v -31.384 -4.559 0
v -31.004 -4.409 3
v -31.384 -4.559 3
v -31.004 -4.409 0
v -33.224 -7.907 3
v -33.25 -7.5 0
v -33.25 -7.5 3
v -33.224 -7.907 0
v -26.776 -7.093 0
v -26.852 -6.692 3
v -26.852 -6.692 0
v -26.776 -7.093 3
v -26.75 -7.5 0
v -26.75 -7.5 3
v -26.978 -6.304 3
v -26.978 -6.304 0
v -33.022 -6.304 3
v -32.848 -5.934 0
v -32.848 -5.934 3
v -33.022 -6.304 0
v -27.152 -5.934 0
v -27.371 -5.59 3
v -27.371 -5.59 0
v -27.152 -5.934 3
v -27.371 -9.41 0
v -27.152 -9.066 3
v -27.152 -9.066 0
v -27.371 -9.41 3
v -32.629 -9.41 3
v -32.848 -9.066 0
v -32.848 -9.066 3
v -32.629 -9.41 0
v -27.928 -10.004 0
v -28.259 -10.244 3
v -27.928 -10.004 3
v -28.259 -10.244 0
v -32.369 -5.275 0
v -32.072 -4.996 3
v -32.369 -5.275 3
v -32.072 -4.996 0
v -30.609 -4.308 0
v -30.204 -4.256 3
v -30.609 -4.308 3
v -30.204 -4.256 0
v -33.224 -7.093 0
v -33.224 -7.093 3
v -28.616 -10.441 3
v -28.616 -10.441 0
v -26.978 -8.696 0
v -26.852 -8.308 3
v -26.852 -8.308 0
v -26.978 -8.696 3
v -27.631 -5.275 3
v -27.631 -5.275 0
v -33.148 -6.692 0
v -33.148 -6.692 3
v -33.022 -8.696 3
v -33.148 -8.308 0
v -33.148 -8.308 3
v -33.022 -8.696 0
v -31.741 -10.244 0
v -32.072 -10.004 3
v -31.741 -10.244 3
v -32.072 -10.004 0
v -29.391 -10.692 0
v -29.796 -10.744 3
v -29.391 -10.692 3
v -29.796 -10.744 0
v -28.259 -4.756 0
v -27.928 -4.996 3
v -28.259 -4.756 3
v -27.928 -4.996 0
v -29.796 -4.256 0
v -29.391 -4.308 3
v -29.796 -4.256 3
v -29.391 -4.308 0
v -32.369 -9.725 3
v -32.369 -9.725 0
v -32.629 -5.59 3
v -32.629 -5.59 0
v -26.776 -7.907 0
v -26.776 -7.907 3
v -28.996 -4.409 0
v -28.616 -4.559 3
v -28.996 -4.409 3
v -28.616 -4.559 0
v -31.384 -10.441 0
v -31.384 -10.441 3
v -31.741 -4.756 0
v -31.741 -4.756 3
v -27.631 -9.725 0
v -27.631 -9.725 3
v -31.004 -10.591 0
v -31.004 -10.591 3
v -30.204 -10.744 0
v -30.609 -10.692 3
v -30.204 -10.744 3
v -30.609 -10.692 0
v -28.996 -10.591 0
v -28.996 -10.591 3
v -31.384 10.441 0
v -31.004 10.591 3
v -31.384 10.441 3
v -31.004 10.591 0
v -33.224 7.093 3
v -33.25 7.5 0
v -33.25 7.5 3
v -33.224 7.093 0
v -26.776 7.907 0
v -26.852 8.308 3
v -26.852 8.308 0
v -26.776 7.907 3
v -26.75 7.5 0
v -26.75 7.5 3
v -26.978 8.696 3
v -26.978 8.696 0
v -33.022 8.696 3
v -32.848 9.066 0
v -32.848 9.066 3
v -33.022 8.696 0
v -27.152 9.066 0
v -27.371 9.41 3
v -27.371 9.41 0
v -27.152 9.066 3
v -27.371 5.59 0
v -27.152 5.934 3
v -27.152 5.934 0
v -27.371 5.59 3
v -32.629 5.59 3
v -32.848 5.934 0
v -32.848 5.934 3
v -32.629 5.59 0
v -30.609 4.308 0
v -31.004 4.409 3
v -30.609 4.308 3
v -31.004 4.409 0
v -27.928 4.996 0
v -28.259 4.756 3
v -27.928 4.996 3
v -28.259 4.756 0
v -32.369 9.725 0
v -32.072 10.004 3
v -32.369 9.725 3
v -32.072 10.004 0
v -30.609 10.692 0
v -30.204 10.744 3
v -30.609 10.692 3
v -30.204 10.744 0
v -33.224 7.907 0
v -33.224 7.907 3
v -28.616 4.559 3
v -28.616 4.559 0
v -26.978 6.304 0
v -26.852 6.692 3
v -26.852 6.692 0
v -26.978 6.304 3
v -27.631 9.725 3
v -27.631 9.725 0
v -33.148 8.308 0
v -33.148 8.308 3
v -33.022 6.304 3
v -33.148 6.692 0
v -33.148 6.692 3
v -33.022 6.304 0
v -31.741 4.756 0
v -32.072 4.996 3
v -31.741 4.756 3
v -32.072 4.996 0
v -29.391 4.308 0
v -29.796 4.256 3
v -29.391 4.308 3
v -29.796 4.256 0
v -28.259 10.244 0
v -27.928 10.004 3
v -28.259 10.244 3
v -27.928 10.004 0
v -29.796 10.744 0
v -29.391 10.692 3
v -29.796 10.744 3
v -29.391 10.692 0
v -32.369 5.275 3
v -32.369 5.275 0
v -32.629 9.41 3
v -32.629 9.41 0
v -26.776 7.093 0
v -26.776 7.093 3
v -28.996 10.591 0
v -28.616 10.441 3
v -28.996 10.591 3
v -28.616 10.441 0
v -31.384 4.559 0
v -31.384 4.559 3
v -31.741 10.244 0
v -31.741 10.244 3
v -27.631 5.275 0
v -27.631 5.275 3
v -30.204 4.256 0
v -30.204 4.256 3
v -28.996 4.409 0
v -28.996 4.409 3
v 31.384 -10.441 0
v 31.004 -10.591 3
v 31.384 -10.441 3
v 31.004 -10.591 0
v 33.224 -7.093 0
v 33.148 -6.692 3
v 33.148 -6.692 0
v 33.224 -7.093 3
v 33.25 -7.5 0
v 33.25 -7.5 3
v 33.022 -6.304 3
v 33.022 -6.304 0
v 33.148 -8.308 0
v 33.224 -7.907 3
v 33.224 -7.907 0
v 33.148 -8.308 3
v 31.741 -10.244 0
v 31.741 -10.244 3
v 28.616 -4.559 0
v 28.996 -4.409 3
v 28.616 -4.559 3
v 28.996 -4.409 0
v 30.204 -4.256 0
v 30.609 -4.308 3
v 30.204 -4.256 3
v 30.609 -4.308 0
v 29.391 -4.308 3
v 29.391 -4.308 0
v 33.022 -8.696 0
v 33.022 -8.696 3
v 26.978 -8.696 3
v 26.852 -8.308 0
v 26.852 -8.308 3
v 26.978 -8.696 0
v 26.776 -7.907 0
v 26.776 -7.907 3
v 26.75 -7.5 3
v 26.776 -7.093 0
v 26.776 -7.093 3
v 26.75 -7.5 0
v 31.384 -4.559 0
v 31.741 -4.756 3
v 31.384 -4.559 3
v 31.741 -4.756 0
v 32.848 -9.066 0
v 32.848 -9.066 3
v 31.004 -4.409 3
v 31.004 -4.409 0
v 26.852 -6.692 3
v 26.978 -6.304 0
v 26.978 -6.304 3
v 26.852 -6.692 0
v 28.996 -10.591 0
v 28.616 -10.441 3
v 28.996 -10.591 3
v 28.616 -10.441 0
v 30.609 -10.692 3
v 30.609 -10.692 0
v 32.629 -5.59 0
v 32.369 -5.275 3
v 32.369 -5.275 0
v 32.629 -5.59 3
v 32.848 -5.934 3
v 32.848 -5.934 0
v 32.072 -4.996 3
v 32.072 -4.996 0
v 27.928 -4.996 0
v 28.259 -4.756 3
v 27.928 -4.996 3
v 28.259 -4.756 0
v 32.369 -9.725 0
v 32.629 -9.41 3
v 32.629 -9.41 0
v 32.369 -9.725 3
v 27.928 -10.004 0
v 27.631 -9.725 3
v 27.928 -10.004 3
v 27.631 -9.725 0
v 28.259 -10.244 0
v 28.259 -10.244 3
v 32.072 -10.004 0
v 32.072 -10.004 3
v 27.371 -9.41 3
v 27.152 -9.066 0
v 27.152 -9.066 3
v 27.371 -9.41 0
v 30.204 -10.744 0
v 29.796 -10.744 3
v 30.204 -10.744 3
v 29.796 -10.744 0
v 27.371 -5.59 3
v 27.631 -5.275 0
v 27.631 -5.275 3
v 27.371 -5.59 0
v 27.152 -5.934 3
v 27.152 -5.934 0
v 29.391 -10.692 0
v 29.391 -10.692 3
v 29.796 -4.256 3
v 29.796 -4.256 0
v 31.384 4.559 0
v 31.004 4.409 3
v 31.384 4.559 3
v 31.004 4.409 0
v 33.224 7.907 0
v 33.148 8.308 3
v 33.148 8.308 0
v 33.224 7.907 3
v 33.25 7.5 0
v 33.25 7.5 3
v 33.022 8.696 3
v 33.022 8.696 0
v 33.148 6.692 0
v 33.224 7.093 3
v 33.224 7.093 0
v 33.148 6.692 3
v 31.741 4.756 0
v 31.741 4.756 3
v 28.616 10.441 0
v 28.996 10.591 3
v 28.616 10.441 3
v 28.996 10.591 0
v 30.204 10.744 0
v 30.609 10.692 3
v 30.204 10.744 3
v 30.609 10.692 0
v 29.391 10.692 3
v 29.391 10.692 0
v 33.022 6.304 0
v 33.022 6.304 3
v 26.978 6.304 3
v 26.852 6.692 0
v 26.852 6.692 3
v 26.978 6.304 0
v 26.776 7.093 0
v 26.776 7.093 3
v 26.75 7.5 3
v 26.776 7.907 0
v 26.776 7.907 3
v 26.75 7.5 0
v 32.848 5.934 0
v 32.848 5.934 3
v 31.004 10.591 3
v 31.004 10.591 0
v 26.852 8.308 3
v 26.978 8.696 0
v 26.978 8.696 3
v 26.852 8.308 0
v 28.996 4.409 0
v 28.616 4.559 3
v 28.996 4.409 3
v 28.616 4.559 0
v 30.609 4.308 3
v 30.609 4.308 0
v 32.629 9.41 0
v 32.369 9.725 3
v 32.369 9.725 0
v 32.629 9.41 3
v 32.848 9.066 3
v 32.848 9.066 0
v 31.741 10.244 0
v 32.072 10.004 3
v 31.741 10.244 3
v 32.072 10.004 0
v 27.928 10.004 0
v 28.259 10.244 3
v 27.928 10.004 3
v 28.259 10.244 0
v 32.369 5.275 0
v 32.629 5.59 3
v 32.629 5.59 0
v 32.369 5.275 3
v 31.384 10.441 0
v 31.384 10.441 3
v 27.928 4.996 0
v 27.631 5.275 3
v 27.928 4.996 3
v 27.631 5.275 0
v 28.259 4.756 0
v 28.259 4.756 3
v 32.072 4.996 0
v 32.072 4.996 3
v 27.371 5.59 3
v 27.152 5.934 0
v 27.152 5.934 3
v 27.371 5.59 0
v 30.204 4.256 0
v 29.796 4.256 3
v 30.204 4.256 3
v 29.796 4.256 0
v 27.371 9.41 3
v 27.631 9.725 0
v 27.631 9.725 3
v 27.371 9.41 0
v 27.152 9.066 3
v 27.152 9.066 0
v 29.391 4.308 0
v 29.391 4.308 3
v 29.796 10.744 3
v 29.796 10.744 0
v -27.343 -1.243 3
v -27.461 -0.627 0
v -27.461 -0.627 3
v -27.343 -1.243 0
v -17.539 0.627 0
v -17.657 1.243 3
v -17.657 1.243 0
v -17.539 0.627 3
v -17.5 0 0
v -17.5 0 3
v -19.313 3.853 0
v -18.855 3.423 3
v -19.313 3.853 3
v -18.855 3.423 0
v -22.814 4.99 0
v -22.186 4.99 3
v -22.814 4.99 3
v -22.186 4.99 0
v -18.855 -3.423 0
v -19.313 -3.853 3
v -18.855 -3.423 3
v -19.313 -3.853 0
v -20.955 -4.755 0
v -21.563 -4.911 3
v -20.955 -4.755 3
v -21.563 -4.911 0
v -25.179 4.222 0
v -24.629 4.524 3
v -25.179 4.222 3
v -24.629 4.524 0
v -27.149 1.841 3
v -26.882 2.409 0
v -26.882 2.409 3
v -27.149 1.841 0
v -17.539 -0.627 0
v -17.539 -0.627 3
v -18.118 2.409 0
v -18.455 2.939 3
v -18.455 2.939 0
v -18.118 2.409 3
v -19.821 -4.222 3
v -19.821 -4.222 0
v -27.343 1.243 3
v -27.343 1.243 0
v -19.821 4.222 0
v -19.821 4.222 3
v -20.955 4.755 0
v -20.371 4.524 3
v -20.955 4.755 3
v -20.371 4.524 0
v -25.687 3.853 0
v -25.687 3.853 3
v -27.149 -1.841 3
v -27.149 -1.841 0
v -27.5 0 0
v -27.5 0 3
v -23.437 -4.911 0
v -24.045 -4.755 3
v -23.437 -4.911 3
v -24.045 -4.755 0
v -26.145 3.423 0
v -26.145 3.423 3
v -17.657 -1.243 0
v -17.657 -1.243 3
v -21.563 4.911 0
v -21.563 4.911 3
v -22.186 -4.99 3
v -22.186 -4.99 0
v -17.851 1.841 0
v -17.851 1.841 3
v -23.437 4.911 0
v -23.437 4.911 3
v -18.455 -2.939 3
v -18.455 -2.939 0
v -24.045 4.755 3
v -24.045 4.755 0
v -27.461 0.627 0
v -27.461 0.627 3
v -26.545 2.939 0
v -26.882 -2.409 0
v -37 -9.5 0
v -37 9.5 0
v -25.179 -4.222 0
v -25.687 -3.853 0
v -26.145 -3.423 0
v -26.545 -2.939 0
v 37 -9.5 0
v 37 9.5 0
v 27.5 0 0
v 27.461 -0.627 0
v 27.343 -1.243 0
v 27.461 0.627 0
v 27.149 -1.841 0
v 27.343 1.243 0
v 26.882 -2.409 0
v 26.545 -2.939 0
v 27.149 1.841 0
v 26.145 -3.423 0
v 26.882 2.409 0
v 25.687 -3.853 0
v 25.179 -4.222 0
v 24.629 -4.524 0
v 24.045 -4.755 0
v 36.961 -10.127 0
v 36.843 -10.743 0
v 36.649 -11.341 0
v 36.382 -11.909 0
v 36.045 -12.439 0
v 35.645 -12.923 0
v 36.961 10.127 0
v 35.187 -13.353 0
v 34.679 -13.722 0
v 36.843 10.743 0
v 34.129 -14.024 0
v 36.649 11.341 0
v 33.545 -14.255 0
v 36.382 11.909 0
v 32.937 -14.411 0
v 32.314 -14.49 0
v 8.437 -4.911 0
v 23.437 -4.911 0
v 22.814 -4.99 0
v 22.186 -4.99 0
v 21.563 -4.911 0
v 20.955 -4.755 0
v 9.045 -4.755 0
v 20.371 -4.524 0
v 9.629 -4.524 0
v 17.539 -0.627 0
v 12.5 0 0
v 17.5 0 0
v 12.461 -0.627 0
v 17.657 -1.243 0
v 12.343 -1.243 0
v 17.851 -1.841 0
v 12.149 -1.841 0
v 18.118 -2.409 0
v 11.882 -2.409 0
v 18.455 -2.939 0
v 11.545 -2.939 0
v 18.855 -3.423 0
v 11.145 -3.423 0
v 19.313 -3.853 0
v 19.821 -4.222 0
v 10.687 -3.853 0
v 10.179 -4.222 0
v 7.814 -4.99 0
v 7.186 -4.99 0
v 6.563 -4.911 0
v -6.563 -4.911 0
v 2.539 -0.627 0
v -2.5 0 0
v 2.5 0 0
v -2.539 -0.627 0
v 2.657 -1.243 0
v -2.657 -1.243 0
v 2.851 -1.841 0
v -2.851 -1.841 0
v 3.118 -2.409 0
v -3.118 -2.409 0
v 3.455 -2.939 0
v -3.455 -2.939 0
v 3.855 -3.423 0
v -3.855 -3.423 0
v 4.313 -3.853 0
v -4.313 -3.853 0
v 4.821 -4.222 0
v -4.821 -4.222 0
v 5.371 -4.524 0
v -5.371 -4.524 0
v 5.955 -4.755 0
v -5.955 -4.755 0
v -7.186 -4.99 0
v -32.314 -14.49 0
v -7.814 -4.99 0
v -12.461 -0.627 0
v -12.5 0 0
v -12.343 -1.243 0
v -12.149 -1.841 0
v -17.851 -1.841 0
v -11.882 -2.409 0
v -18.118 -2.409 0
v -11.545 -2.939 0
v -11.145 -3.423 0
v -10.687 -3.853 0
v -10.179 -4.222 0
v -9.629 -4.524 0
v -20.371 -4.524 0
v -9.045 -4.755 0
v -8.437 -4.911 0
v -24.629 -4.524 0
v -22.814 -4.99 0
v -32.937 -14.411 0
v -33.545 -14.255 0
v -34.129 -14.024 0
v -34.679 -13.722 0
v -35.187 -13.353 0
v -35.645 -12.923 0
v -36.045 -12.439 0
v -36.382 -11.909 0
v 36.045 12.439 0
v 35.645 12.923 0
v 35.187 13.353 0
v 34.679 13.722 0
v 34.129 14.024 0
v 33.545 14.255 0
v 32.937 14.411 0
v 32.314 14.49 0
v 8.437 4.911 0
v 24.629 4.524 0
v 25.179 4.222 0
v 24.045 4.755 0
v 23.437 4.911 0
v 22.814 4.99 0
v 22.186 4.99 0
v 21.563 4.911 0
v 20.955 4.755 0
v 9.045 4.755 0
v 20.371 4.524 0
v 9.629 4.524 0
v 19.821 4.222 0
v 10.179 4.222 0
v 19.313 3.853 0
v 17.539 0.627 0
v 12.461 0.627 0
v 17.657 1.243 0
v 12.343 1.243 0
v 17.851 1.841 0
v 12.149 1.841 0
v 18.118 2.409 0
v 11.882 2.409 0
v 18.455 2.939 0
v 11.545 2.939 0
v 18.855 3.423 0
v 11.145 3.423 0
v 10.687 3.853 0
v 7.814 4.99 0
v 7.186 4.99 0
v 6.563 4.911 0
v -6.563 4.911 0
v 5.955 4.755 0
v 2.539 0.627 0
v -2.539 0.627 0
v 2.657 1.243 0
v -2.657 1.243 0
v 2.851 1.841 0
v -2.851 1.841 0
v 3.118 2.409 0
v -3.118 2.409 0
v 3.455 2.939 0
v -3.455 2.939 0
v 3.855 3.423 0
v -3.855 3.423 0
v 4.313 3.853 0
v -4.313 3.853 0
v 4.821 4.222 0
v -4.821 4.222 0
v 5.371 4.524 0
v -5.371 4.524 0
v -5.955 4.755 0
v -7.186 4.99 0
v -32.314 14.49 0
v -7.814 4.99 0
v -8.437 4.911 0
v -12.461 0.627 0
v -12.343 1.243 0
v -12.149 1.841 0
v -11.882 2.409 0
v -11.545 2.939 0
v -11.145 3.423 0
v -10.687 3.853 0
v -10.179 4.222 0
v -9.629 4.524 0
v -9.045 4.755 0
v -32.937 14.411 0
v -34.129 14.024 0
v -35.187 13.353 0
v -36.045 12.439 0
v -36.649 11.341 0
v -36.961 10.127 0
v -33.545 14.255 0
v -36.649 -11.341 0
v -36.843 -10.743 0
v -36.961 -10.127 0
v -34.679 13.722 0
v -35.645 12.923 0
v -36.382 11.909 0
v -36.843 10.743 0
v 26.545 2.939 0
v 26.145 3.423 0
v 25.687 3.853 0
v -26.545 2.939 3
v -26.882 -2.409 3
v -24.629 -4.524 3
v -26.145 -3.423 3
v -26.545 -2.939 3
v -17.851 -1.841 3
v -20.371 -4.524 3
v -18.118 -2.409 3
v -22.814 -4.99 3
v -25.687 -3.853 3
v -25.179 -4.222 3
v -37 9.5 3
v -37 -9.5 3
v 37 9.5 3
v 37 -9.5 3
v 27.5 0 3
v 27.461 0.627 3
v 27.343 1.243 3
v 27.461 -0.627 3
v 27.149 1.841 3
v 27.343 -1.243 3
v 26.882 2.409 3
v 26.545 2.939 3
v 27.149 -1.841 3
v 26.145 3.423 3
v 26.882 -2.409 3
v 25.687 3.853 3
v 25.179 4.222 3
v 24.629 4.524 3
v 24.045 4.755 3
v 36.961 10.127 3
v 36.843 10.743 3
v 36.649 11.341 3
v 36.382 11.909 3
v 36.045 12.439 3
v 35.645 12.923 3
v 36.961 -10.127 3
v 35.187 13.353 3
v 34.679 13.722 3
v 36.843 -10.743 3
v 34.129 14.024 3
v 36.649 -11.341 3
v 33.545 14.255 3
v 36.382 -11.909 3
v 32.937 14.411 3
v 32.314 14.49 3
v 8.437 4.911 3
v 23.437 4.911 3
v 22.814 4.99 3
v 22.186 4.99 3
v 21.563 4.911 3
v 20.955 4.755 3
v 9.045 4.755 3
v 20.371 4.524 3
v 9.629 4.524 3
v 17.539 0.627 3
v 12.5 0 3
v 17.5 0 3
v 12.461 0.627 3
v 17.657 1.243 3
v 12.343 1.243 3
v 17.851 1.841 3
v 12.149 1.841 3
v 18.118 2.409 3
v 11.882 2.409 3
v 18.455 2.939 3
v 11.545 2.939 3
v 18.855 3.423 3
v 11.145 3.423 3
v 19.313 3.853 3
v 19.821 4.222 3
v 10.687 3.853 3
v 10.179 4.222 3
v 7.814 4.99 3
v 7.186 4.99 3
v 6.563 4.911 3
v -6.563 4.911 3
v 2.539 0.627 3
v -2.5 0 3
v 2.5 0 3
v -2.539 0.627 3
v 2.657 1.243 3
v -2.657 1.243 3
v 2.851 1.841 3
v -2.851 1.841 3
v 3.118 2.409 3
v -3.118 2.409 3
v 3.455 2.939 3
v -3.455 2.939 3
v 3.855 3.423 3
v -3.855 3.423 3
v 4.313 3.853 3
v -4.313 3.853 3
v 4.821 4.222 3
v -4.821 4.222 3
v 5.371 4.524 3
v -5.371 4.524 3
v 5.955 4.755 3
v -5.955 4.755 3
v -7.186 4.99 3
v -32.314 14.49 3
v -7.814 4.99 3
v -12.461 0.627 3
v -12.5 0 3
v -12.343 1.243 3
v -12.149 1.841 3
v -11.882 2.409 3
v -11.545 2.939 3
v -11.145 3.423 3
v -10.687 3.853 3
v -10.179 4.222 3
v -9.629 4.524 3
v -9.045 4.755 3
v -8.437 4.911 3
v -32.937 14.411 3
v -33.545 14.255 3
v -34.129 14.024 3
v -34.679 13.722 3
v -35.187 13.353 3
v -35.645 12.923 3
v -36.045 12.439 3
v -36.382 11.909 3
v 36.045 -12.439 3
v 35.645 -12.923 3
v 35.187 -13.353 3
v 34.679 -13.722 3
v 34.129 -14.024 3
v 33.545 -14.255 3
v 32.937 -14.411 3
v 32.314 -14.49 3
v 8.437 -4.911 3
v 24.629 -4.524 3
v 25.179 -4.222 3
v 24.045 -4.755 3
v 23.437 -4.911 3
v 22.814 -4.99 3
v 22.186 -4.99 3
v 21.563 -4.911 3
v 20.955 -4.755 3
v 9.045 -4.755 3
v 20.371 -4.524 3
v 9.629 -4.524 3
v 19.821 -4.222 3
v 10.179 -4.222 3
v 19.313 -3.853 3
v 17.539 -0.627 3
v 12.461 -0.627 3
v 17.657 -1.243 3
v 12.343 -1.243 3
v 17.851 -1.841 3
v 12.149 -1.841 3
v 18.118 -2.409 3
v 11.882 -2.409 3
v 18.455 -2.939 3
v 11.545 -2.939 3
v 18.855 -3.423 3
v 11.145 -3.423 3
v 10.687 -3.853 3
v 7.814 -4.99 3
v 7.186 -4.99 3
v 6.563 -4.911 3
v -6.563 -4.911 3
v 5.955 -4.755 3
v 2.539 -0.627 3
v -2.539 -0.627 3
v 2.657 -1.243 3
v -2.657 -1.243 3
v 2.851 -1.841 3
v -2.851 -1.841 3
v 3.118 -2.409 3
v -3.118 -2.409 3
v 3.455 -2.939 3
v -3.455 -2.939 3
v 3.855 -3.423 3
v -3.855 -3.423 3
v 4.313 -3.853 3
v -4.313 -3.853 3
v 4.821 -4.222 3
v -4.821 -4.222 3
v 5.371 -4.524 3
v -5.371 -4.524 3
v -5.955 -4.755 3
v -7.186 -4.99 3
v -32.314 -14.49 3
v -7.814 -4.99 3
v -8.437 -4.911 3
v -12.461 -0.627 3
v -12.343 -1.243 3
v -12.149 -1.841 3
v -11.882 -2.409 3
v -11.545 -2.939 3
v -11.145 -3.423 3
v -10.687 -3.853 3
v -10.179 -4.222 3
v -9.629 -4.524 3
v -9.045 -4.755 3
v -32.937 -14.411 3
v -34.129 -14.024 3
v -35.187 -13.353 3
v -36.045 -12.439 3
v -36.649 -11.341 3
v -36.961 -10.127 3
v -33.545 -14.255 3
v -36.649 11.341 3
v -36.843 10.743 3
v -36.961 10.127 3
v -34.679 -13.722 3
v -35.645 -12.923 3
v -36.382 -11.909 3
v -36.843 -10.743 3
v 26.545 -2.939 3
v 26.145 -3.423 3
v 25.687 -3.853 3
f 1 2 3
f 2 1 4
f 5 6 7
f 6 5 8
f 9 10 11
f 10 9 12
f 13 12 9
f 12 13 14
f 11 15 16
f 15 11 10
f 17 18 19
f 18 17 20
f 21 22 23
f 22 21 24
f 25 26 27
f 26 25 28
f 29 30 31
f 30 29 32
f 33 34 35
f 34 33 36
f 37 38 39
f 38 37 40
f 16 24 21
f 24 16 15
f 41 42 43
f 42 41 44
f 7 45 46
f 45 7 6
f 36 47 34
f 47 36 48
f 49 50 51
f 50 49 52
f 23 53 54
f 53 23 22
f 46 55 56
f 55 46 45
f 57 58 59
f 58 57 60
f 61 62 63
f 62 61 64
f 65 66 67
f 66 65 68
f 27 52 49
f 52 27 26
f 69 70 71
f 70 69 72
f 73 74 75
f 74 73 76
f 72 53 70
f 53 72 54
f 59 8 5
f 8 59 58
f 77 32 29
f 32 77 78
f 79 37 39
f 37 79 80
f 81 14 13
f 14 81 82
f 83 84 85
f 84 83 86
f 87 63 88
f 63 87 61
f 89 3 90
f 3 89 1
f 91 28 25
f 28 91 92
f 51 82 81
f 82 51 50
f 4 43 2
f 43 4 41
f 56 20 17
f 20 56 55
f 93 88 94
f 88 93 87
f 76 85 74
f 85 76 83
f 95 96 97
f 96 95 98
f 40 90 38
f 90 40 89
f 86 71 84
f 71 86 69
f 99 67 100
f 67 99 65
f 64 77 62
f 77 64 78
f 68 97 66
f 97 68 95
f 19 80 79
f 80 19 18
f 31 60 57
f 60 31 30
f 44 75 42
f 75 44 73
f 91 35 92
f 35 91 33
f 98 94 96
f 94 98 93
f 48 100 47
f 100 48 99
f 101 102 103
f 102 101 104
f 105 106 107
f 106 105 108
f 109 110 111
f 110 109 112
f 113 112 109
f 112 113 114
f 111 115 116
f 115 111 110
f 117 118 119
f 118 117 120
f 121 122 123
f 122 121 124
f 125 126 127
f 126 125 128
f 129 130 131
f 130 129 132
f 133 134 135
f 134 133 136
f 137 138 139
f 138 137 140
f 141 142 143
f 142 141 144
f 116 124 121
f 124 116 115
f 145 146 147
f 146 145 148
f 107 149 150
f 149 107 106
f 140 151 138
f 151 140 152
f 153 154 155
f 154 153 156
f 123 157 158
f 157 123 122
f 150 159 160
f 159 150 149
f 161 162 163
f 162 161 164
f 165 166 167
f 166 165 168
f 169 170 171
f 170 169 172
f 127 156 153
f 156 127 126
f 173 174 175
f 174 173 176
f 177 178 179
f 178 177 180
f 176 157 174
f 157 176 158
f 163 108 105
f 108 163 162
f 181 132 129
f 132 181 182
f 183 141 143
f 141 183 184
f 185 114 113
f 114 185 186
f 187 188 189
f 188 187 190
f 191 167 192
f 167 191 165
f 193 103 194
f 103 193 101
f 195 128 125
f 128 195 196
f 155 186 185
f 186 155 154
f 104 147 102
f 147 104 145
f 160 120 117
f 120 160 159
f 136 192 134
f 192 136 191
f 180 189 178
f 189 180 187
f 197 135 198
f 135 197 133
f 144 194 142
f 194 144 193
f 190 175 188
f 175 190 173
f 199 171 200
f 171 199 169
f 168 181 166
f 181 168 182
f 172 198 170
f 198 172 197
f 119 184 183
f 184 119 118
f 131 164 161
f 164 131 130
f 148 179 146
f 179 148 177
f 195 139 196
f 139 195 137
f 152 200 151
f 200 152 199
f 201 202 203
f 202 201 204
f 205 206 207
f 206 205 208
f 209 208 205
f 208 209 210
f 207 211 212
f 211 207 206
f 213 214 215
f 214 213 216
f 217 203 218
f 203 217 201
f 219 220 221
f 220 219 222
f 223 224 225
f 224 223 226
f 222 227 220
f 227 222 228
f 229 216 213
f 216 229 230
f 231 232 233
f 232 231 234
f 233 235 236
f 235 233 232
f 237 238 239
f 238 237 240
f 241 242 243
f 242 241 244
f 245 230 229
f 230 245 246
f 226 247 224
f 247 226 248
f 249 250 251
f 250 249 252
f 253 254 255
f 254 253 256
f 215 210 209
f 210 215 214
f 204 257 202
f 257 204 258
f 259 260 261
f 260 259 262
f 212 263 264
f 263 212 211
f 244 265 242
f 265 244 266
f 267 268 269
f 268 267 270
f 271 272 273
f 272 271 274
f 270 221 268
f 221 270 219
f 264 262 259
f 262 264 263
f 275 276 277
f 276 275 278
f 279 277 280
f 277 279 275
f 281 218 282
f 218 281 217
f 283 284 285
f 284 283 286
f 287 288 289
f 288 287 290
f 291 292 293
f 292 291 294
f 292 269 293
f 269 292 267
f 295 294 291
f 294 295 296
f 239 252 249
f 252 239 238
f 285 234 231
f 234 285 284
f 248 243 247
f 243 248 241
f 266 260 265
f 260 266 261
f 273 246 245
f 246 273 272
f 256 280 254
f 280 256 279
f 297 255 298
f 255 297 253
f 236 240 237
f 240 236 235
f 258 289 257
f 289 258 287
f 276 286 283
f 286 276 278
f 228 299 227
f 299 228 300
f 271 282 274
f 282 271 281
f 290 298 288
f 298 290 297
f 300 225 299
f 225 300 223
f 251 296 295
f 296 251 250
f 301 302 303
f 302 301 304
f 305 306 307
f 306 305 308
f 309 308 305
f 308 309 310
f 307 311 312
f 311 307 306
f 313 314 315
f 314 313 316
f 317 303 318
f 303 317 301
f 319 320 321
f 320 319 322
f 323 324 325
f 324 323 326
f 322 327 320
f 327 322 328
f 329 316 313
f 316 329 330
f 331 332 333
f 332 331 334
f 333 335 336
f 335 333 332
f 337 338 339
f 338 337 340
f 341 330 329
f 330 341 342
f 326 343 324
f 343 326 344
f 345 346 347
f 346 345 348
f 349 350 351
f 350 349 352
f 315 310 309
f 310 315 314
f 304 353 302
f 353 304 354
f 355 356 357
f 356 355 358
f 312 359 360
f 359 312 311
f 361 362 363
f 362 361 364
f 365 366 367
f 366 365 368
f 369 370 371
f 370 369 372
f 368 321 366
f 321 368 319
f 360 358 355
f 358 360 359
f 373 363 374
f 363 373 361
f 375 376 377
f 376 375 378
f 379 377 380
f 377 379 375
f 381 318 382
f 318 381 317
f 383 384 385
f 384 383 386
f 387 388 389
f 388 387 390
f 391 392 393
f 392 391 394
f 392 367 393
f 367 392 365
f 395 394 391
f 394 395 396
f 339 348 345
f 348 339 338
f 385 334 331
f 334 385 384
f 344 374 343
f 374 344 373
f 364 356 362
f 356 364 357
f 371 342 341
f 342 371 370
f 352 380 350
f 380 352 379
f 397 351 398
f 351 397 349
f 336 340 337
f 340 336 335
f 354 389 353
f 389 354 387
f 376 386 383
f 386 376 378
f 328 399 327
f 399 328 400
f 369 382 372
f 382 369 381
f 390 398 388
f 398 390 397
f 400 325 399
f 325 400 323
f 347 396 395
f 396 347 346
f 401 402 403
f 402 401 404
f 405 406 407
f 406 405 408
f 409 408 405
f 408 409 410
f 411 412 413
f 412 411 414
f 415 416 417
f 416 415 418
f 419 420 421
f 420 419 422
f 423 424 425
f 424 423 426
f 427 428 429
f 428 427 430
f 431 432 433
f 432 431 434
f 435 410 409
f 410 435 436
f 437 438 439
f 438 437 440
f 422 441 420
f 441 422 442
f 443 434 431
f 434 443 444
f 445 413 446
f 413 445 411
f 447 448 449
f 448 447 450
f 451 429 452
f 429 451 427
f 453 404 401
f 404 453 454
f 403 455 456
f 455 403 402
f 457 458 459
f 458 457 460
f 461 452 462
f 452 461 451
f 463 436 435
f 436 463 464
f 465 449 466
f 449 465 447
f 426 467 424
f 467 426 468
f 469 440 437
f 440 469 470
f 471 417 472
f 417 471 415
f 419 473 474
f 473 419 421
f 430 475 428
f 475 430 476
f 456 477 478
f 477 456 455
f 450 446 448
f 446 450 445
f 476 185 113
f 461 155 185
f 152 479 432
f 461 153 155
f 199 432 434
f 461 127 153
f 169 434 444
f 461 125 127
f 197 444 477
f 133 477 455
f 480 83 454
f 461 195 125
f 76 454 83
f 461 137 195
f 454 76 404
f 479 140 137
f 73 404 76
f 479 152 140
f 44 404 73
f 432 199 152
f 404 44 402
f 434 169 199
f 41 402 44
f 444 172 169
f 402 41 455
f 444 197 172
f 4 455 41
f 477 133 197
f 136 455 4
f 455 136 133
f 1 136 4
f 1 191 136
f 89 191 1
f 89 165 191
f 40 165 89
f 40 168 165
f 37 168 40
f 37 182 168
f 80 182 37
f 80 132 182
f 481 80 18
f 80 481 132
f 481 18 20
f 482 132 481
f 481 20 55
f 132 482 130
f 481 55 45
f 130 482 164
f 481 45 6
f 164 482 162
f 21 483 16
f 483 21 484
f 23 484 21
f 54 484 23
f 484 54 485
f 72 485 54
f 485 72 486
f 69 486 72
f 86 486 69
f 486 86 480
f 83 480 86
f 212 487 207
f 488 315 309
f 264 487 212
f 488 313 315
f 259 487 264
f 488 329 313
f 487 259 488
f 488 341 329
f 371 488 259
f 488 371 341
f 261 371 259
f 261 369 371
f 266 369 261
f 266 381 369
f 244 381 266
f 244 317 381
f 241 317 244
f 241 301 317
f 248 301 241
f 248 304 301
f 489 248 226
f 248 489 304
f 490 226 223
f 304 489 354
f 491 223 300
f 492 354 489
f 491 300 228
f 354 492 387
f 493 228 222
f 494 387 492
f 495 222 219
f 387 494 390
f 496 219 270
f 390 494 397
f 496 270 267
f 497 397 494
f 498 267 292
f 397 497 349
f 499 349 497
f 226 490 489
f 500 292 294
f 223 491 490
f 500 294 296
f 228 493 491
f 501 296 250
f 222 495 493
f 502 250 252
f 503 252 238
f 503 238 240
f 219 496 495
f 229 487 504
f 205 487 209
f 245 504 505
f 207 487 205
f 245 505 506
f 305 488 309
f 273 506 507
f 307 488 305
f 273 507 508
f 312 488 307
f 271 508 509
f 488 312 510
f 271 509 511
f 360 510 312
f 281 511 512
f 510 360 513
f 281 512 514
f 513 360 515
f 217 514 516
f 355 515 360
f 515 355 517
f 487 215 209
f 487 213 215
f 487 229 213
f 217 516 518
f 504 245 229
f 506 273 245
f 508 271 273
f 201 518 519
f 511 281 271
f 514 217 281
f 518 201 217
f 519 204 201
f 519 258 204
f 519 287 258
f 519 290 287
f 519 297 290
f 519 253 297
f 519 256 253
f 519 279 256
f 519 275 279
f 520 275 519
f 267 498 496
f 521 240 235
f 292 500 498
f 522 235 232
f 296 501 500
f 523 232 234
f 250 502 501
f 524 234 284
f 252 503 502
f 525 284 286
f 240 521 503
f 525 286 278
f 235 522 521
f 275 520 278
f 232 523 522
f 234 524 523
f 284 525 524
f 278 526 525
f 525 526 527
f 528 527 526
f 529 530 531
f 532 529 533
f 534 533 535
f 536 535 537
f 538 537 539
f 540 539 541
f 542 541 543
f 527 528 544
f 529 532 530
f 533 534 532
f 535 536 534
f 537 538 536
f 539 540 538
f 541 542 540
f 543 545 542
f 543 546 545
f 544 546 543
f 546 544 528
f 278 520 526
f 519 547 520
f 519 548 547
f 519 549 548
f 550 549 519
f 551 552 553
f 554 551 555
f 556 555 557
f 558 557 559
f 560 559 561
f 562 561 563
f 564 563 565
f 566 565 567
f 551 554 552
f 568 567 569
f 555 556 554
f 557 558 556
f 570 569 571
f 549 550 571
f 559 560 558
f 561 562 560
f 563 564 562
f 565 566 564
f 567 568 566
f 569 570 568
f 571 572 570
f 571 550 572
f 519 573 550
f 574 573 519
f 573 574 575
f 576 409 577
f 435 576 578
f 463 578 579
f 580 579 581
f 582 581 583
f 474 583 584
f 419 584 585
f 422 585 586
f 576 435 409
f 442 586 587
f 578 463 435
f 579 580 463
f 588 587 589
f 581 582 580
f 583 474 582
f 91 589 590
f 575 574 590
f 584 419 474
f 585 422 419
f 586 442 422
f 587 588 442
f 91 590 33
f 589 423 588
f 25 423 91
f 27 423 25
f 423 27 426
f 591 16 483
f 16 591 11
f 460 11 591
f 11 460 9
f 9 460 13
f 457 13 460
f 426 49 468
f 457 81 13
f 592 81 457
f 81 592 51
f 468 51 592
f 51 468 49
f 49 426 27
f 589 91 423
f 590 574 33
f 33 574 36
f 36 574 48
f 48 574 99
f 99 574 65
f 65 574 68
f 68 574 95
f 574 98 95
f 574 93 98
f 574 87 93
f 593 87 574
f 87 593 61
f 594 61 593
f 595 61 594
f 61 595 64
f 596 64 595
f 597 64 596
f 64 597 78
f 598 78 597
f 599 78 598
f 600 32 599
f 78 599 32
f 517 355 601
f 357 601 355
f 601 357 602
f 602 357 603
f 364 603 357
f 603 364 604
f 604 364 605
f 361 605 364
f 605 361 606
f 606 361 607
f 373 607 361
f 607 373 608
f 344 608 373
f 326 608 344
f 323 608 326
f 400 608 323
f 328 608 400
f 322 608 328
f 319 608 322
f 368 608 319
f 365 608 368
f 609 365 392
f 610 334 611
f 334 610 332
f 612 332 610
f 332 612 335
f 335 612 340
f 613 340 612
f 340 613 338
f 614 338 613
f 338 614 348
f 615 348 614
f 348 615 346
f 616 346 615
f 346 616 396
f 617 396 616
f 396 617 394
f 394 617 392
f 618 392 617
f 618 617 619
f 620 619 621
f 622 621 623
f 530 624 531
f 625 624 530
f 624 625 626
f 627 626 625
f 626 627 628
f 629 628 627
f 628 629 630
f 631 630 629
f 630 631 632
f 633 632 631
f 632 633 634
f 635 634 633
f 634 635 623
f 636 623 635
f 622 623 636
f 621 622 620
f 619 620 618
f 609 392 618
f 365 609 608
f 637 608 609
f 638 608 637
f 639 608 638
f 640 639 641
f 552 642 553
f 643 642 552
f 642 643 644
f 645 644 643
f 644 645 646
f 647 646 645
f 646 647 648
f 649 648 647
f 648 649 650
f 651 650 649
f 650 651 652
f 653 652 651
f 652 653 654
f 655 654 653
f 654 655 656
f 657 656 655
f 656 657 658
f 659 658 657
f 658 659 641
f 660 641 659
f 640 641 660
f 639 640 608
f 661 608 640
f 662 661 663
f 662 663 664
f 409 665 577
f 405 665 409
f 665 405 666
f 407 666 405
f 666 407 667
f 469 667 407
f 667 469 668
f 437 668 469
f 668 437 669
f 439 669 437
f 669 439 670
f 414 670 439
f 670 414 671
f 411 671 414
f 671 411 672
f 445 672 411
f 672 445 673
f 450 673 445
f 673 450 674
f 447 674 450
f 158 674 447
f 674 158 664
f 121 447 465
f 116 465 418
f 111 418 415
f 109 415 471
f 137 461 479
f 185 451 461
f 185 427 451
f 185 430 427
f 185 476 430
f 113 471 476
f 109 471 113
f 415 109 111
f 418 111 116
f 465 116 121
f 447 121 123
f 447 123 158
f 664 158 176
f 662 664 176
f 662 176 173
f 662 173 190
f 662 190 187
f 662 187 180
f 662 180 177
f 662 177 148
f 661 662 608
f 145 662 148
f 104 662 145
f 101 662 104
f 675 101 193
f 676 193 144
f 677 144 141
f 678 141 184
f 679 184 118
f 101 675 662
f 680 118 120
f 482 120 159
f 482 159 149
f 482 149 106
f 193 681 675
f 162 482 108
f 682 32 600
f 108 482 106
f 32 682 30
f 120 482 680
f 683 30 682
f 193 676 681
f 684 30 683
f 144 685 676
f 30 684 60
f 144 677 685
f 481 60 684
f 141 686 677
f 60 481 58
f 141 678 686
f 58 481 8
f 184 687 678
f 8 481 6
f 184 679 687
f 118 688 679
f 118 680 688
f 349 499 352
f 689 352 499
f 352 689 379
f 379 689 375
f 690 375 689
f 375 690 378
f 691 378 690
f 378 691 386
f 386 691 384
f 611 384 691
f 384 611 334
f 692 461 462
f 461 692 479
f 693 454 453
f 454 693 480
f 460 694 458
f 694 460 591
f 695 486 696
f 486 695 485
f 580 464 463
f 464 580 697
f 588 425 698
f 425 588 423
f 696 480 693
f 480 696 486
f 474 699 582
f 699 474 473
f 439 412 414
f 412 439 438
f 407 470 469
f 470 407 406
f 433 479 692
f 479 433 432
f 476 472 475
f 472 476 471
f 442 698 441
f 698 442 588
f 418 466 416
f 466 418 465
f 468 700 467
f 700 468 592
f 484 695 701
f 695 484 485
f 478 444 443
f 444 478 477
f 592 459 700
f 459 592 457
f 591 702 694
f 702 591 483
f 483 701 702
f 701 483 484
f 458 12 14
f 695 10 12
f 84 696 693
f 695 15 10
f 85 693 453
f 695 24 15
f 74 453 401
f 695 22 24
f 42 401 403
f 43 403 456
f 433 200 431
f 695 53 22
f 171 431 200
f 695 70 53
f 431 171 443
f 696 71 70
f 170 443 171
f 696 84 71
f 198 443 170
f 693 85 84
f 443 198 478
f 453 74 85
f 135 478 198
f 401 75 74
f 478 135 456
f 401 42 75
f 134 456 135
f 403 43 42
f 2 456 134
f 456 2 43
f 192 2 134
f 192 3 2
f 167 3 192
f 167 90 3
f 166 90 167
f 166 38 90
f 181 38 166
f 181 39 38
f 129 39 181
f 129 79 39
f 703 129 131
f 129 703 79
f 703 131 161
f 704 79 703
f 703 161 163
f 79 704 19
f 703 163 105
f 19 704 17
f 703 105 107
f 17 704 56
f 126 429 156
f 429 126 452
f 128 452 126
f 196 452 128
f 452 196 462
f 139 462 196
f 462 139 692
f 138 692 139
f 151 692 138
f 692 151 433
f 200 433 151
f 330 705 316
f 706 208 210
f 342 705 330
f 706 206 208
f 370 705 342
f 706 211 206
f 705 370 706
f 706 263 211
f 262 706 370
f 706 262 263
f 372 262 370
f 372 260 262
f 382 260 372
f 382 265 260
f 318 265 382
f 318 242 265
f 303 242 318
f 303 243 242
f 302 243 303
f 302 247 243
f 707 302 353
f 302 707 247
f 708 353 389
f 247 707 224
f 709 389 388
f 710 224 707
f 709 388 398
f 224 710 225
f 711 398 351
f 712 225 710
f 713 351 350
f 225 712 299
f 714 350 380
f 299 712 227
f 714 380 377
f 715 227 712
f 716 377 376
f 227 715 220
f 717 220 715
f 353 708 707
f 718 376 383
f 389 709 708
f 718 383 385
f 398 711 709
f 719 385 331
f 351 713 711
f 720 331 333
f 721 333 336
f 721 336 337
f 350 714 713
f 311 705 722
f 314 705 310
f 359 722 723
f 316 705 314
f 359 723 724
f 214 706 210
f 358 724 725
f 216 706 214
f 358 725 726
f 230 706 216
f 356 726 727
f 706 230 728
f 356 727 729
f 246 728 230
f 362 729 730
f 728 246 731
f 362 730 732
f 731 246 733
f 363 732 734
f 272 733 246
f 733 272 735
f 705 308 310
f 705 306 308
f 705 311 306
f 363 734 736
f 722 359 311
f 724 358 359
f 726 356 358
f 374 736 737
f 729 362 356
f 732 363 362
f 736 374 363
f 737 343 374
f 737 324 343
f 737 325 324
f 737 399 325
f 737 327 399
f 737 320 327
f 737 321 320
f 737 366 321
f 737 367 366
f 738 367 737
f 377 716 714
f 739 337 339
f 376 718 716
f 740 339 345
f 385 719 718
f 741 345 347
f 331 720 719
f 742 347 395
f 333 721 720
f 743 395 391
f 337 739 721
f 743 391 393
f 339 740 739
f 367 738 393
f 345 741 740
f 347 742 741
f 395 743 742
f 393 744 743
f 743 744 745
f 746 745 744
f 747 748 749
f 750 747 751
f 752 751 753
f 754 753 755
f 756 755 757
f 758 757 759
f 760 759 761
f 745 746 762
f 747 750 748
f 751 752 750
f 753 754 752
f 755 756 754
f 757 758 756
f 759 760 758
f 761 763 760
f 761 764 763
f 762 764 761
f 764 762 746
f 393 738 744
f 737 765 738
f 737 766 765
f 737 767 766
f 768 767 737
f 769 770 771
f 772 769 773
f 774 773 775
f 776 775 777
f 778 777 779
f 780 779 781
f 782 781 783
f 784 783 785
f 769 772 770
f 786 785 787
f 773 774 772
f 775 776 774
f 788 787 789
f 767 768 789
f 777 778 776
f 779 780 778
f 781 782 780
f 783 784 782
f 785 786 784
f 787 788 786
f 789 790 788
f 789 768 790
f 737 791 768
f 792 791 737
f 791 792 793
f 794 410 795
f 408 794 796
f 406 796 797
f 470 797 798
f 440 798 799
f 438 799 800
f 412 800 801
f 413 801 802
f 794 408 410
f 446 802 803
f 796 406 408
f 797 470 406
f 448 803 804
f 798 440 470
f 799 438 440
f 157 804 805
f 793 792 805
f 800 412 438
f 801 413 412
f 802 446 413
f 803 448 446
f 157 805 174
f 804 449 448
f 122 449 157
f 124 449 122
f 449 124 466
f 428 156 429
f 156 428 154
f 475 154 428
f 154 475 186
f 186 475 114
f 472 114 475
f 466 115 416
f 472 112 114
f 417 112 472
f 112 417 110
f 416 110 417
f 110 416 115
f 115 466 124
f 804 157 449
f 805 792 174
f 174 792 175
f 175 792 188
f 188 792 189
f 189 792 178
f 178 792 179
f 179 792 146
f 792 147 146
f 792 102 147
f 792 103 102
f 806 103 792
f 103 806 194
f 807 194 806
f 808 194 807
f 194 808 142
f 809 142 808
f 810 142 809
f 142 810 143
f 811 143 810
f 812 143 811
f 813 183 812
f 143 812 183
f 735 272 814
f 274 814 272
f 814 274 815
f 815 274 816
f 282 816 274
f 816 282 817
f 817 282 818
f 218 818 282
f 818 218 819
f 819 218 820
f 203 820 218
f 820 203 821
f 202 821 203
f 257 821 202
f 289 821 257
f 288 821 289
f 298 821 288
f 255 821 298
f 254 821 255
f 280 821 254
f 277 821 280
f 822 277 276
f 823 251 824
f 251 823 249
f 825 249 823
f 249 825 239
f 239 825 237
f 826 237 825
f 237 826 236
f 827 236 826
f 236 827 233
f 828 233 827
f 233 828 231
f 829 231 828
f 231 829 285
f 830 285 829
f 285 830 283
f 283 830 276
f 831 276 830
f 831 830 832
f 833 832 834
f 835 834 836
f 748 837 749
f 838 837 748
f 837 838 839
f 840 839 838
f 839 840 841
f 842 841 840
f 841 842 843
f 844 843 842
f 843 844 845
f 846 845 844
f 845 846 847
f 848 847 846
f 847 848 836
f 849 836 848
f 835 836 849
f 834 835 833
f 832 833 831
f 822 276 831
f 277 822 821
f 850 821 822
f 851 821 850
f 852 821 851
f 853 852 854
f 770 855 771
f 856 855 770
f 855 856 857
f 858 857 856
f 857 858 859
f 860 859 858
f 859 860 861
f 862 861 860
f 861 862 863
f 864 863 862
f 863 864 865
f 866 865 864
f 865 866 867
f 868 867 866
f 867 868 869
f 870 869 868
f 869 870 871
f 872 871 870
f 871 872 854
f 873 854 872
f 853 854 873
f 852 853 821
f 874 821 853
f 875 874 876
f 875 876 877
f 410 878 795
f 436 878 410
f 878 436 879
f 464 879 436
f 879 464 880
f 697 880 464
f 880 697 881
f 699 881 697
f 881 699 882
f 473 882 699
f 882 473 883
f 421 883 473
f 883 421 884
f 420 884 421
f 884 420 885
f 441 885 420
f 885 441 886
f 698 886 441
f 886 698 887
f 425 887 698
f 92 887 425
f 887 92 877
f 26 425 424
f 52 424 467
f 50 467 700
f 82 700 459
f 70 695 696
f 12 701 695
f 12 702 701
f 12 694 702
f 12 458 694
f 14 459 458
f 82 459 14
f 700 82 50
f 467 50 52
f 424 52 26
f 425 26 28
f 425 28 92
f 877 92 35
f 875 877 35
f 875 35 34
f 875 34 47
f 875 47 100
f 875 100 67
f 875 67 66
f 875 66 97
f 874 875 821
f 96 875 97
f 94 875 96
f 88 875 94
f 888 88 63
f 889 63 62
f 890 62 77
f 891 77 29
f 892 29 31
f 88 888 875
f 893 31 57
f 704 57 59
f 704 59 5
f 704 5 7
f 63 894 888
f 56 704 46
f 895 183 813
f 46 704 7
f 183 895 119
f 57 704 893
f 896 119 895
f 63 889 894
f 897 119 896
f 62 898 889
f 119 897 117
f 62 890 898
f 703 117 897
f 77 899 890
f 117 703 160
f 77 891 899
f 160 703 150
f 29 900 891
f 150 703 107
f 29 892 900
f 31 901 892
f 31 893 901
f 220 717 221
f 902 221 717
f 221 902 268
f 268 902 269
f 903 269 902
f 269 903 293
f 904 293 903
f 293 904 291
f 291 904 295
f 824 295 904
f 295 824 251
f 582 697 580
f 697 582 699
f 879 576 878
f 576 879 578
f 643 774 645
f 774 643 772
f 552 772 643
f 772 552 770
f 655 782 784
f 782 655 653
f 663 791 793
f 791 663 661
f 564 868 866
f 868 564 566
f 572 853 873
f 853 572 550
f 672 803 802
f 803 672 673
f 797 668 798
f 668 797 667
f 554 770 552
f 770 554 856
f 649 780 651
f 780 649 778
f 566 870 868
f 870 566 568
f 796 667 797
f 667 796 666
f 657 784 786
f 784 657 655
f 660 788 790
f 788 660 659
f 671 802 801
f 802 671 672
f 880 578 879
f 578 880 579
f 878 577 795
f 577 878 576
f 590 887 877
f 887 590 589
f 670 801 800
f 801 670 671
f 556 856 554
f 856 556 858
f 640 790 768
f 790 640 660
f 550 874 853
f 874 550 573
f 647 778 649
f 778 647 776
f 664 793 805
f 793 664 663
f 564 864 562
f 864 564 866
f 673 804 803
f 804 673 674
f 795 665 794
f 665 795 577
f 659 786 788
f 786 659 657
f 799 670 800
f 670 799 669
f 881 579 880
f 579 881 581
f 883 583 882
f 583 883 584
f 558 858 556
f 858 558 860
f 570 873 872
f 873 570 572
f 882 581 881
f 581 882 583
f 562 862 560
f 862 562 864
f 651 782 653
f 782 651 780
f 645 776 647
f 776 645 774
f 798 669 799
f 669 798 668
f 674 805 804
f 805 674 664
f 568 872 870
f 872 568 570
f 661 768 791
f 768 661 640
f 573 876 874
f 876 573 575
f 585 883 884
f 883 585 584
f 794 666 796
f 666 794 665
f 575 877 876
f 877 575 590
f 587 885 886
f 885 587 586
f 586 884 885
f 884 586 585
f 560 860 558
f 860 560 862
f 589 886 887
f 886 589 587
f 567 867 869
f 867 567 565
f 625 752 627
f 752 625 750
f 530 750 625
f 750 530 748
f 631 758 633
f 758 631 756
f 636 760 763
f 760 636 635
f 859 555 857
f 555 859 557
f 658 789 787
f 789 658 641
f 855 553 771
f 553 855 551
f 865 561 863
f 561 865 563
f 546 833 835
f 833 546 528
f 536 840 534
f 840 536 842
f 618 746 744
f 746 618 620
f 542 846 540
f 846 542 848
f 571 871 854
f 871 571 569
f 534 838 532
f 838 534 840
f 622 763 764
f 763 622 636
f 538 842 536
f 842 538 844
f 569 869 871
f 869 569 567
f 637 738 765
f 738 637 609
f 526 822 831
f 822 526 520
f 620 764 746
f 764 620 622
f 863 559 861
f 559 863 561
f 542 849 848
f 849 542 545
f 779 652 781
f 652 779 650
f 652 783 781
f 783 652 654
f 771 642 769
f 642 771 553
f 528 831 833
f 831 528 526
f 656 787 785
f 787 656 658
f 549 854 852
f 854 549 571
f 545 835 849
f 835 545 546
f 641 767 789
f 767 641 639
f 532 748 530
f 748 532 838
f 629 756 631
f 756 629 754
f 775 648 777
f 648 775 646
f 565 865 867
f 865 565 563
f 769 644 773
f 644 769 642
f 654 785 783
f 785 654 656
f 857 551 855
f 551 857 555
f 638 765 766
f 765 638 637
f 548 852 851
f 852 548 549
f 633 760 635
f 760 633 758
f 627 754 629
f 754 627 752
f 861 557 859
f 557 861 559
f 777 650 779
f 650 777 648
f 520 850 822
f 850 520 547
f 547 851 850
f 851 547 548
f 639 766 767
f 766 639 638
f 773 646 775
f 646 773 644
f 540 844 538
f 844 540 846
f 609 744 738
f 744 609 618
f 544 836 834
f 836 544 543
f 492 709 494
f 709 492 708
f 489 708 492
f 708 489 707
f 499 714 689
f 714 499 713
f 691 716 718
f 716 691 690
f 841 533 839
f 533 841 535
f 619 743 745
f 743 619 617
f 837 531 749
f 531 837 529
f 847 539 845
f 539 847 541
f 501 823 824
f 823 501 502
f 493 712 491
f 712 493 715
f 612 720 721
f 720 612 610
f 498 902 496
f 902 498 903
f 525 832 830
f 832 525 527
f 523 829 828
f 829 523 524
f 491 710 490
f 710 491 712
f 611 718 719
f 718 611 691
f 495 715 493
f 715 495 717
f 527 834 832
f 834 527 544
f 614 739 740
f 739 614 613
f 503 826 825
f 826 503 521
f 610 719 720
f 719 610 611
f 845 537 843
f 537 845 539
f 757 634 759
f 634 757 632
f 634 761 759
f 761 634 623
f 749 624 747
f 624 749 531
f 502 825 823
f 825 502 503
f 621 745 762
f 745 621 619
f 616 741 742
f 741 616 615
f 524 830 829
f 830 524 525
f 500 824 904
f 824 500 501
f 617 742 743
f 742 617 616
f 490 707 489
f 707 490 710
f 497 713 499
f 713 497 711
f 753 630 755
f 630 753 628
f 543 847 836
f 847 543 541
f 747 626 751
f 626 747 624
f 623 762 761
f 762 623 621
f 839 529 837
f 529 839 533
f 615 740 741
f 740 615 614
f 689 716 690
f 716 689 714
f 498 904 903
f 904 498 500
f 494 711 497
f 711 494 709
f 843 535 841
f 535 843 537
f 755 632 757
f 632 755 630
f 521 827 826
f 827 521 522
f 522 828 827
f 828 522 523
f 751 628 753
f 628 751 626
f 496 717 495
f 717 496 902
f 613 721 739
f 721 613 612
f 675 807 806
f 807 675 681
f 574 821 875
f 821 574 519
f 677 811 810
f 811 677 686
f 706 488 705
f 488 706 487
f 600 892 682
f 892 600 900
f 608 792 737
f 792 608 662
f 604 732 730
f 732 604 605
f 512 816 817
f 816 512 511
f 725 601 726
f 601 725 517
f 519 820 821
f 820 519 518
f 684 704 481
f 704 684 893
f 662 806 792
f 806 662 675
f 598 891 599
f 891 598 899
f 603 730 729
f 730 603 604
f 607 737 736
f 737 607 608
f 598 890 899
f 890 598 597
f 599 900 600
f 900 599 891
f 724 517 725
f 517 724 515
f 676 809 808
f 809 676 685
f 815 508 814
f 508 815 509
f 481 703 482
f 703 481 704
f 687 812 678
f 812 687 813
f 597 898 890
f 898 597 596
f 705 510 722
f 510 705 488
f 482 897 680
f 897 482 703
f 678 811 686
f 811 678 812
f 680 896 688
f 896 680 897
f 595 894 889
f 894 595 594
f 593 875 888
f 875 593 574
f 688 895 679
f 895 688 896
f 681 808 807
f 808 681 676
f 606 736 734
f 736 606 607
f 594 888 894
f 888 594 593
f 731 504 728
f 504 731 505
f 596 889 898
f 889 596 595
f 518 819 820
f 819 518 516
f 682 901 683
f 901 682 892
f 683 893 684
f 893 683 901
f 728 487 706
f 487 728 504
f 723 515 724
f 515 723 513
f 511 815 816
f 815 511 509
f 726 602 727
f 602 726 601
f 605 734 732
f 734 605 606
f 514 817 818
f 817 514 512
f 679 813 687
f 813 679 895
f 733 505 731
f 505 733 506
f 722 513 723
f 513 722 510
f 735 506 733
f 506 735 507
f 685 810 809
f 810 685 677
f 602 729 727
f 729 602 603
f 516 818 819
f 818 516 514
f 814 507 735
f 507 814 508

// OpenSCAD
$fn = 50;

difference() {
	union() {
		hull() {
			translate(v = [-32.0, 9.5, 0]) {
				cylinder(h = 3, r = 5);
			}
			translate(v = [32.0, 9.5, 0]) {
				cylinder(h = 3, r = 5);
			}
			translate(v = [-32.0, -9.5, 0]) {
				cylinder(h = 3, r = 5);
			}
			translate(v = [32.0, -9.5, 0]) {
				cylinder(h = 3, r = 5);
			}
		}
	}
	union() {
		translate(v = [-30.0, -7.5, -100.0]) {
			cylinder(h = 200, r = 3.25);
		}
		translate(v = [-30.0, 7.5, -100.0]) {
			cylinder(h = 200, r = 3.25);
		}
		translate(v = [30.0, -7.5, -100.0]) {
			cylinder(h = 200, r = 3.25);
		}
		translate(v = [30.0, 7.5, -100.0]) {
			cylinder(h = 200, r = 3.25);
		}
		translate(v = [-30.0, -7.5, -100.0]) {
			cylinder(h = 200, r = 1.8);
		}
		translate(v = [-30.0, 7.5, -100.0]) {
			cylinder(h = 200, r = 1.8);
		}
		translate(v = [30.0, -7.5, -100.0]) {
			cylinder(h = 200, r = 1.8);
		}
		translate(v = [30.0, 7.5, -100.0]) {
			cylinder(h = 200, r = 1.8);
		}
		translate(v = [-22.5, 0, 0.0]) {
			cylinder(h = 3, r = 5.0);
		}
		translate(v = [-7.5, 0, 0.0]) {
			cylinder(h = 3, r = 5.0);
		}
		translate(v = [7.5, 0, 0.0]) {
			cylinder(h = 3, r = 5.0);
		}
		translate(v = [22.5, 0, 0.0]) {
			cylinder(h = 3, r = 5.0);
		}
	}
}
